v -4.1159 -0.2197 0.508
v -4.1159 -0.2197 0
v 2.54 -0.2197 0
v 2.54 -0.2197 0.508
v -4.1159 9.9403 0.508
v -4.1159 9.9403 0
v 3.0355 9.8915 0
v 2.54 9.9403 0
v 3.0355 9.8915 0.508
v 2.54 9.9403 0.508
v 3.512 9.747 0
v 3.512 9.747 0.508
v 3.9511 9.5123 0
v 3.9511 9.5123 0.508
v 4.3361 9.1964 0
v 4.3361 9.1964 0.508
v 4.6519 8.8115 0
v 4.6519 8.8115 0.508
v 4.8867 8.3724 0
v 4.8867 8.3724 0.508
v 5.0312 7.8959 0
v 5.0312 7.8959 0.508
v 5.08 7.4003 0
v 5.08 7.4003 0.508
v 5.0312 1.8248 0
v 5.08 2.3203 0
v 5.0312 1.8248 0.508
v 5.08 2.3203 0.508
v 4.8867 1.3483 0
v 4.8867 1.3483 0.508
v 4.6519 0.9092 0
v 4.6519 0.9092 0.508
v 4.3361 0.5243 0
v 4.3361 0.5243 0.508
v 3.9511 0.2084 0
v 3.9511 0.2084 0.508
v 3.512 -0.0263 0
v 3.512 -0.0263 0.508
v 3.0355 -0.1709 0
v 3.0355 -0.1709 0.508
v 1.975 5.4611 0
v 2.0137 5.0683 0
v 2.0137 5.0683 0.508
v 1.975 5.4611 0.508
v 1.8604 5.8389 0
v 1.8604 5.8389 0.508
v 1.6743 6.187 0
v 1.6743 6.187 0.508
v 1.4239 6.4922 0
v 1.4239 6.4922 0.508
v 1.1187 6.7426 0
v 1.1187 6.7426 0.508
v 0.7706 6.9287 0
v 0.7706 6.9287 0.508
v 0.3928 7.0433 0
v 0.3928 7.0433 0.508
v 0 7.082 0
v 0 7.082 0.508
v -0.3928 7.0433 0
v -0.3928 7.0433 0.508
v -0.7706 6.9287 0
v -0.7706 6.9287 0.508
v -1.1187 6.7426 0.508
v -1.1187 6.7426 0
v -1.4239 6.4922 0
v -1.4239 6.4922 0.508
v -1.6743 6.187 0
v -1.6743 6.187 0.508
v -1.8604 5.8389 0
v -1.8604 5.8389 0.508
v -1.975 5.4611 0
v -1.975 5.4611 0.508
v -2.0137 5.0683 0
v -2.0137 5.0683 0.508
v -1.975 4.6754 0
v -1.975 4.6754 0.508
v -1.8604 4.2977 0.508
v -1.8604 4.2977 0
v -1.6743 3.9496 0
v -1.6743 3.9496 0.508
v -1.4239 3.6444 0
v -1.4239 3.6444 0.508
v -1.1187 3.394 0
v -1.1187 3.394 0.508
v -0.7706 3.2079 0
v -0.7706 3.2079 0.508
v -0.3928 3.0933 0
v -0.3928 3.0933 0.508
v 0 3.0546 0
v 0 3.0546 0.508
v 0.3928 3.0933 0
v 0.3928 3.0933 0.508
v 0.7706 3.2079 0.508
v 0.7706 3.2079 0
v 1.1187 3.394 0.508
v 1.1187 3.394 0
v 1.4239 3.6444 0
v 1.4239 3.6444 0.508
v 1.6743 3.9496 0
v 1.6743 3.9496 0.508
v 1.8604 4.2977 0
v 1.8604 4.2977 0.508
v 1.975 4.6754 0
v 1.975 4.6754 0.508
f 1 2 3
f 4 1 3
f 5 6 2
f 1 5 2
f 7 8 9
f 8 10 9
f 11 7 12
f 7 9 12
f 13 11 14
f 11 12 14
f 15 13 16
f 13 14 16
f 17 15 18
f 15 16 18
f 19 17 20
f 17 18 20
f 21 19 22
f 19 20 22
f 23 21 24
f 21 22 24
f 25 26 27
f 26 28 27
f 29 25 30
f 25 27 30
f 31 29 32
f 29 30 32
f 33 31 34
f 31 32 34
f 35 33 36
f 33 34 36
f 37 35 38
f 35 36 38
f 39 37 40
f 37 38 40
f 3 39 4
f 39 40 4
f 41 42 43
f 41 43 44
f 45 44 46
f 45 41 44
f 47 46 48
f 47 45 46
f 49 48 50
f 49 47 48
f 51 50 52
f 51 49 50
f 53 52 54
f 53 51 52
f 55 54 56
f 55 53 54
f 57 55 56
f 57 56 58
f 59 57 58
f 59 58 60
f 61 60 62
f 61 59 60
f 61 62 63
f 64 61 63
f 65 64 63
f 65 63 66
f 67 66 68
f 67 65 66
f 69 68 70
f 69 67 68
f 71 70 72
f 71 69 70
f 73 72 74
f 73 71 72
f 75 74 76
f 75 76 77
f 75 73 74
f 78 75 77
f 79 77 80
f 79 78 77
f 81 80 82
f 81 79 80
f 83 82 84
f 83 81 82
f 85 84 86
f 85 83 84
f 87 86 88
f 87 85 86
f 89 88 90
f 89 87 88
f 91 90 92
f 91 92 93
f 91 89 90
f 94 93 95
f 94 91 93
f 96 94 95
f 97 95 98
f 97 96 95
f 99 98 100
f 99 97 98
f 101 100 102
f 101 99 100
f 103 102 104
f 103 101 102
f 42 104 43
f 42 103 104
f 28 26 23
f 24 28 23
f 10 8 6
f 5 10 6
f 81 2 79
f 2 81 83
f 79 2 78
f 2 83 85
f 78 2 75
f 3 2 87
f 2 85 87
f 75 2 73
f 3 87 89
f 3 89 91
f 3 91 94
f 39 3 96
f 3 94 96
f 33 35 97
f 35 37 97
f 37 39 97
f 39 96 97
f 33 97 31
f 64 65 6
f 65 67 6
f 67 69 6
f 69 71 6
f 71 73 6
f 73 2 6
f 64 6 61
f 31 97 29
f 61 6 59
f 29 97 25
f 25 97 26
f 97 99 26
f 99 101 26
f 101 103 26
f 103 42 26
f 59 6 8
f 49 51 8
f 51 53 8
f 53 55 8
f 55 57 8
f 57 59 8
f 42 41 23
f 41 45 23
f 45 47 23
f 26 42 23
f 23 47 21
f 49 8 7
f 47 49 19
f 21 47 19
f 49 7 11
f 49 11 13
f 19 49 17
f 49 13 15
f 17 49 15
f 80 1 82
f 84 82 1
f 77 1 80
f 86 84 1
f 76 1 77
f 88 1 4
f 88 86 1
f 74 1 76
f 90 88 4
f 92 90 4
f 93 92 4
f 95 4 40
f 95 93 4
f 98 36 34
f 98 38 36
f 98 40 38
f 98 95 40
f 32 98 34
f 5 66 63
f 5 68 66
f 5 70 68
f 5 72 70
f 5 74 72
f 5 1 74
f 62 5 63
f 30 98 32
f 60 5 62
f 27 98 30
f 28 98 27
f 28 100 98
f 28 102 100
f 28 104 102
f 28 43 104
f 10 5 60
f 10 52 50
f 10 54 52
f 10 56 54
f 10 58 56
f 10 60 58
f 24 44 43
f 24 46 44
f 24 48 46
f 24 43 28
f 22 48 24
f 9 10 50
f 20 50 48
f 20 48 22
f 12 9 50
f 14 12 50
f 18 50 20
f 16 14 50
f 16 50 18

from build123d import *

# Parameters (mm, degrees)
F0_R     = 2.013664
F1_DEPTH = 0.508
F2_R     = 2.54


with BuildPart() as f1:
    # F0 (on Top) → F1 (new body)
    with BuildSketch(Plane.XY):
        Polygon((5.08, 9.940335), (-3.64114, 9.940335), (-4.115906, 9.940335), (-4.115906, -0.219665), (5.08, -0.219665), align=None)
        with Locations((0, 5.06829)):
            Circle(F0_R, mode=Mode.SUBTRACT)
    extrude(amount=F1_DEPTH)

    # F2
    f2_edges = [f1.edges().sort_by_distance(p)[0] for p in [
        (5.08, 9.940335, 0.254),
        (5.08, -0.219665, 0.254),
    ]]
    fillet(f2_edges, radius=F2_R)


solid = f1.part
